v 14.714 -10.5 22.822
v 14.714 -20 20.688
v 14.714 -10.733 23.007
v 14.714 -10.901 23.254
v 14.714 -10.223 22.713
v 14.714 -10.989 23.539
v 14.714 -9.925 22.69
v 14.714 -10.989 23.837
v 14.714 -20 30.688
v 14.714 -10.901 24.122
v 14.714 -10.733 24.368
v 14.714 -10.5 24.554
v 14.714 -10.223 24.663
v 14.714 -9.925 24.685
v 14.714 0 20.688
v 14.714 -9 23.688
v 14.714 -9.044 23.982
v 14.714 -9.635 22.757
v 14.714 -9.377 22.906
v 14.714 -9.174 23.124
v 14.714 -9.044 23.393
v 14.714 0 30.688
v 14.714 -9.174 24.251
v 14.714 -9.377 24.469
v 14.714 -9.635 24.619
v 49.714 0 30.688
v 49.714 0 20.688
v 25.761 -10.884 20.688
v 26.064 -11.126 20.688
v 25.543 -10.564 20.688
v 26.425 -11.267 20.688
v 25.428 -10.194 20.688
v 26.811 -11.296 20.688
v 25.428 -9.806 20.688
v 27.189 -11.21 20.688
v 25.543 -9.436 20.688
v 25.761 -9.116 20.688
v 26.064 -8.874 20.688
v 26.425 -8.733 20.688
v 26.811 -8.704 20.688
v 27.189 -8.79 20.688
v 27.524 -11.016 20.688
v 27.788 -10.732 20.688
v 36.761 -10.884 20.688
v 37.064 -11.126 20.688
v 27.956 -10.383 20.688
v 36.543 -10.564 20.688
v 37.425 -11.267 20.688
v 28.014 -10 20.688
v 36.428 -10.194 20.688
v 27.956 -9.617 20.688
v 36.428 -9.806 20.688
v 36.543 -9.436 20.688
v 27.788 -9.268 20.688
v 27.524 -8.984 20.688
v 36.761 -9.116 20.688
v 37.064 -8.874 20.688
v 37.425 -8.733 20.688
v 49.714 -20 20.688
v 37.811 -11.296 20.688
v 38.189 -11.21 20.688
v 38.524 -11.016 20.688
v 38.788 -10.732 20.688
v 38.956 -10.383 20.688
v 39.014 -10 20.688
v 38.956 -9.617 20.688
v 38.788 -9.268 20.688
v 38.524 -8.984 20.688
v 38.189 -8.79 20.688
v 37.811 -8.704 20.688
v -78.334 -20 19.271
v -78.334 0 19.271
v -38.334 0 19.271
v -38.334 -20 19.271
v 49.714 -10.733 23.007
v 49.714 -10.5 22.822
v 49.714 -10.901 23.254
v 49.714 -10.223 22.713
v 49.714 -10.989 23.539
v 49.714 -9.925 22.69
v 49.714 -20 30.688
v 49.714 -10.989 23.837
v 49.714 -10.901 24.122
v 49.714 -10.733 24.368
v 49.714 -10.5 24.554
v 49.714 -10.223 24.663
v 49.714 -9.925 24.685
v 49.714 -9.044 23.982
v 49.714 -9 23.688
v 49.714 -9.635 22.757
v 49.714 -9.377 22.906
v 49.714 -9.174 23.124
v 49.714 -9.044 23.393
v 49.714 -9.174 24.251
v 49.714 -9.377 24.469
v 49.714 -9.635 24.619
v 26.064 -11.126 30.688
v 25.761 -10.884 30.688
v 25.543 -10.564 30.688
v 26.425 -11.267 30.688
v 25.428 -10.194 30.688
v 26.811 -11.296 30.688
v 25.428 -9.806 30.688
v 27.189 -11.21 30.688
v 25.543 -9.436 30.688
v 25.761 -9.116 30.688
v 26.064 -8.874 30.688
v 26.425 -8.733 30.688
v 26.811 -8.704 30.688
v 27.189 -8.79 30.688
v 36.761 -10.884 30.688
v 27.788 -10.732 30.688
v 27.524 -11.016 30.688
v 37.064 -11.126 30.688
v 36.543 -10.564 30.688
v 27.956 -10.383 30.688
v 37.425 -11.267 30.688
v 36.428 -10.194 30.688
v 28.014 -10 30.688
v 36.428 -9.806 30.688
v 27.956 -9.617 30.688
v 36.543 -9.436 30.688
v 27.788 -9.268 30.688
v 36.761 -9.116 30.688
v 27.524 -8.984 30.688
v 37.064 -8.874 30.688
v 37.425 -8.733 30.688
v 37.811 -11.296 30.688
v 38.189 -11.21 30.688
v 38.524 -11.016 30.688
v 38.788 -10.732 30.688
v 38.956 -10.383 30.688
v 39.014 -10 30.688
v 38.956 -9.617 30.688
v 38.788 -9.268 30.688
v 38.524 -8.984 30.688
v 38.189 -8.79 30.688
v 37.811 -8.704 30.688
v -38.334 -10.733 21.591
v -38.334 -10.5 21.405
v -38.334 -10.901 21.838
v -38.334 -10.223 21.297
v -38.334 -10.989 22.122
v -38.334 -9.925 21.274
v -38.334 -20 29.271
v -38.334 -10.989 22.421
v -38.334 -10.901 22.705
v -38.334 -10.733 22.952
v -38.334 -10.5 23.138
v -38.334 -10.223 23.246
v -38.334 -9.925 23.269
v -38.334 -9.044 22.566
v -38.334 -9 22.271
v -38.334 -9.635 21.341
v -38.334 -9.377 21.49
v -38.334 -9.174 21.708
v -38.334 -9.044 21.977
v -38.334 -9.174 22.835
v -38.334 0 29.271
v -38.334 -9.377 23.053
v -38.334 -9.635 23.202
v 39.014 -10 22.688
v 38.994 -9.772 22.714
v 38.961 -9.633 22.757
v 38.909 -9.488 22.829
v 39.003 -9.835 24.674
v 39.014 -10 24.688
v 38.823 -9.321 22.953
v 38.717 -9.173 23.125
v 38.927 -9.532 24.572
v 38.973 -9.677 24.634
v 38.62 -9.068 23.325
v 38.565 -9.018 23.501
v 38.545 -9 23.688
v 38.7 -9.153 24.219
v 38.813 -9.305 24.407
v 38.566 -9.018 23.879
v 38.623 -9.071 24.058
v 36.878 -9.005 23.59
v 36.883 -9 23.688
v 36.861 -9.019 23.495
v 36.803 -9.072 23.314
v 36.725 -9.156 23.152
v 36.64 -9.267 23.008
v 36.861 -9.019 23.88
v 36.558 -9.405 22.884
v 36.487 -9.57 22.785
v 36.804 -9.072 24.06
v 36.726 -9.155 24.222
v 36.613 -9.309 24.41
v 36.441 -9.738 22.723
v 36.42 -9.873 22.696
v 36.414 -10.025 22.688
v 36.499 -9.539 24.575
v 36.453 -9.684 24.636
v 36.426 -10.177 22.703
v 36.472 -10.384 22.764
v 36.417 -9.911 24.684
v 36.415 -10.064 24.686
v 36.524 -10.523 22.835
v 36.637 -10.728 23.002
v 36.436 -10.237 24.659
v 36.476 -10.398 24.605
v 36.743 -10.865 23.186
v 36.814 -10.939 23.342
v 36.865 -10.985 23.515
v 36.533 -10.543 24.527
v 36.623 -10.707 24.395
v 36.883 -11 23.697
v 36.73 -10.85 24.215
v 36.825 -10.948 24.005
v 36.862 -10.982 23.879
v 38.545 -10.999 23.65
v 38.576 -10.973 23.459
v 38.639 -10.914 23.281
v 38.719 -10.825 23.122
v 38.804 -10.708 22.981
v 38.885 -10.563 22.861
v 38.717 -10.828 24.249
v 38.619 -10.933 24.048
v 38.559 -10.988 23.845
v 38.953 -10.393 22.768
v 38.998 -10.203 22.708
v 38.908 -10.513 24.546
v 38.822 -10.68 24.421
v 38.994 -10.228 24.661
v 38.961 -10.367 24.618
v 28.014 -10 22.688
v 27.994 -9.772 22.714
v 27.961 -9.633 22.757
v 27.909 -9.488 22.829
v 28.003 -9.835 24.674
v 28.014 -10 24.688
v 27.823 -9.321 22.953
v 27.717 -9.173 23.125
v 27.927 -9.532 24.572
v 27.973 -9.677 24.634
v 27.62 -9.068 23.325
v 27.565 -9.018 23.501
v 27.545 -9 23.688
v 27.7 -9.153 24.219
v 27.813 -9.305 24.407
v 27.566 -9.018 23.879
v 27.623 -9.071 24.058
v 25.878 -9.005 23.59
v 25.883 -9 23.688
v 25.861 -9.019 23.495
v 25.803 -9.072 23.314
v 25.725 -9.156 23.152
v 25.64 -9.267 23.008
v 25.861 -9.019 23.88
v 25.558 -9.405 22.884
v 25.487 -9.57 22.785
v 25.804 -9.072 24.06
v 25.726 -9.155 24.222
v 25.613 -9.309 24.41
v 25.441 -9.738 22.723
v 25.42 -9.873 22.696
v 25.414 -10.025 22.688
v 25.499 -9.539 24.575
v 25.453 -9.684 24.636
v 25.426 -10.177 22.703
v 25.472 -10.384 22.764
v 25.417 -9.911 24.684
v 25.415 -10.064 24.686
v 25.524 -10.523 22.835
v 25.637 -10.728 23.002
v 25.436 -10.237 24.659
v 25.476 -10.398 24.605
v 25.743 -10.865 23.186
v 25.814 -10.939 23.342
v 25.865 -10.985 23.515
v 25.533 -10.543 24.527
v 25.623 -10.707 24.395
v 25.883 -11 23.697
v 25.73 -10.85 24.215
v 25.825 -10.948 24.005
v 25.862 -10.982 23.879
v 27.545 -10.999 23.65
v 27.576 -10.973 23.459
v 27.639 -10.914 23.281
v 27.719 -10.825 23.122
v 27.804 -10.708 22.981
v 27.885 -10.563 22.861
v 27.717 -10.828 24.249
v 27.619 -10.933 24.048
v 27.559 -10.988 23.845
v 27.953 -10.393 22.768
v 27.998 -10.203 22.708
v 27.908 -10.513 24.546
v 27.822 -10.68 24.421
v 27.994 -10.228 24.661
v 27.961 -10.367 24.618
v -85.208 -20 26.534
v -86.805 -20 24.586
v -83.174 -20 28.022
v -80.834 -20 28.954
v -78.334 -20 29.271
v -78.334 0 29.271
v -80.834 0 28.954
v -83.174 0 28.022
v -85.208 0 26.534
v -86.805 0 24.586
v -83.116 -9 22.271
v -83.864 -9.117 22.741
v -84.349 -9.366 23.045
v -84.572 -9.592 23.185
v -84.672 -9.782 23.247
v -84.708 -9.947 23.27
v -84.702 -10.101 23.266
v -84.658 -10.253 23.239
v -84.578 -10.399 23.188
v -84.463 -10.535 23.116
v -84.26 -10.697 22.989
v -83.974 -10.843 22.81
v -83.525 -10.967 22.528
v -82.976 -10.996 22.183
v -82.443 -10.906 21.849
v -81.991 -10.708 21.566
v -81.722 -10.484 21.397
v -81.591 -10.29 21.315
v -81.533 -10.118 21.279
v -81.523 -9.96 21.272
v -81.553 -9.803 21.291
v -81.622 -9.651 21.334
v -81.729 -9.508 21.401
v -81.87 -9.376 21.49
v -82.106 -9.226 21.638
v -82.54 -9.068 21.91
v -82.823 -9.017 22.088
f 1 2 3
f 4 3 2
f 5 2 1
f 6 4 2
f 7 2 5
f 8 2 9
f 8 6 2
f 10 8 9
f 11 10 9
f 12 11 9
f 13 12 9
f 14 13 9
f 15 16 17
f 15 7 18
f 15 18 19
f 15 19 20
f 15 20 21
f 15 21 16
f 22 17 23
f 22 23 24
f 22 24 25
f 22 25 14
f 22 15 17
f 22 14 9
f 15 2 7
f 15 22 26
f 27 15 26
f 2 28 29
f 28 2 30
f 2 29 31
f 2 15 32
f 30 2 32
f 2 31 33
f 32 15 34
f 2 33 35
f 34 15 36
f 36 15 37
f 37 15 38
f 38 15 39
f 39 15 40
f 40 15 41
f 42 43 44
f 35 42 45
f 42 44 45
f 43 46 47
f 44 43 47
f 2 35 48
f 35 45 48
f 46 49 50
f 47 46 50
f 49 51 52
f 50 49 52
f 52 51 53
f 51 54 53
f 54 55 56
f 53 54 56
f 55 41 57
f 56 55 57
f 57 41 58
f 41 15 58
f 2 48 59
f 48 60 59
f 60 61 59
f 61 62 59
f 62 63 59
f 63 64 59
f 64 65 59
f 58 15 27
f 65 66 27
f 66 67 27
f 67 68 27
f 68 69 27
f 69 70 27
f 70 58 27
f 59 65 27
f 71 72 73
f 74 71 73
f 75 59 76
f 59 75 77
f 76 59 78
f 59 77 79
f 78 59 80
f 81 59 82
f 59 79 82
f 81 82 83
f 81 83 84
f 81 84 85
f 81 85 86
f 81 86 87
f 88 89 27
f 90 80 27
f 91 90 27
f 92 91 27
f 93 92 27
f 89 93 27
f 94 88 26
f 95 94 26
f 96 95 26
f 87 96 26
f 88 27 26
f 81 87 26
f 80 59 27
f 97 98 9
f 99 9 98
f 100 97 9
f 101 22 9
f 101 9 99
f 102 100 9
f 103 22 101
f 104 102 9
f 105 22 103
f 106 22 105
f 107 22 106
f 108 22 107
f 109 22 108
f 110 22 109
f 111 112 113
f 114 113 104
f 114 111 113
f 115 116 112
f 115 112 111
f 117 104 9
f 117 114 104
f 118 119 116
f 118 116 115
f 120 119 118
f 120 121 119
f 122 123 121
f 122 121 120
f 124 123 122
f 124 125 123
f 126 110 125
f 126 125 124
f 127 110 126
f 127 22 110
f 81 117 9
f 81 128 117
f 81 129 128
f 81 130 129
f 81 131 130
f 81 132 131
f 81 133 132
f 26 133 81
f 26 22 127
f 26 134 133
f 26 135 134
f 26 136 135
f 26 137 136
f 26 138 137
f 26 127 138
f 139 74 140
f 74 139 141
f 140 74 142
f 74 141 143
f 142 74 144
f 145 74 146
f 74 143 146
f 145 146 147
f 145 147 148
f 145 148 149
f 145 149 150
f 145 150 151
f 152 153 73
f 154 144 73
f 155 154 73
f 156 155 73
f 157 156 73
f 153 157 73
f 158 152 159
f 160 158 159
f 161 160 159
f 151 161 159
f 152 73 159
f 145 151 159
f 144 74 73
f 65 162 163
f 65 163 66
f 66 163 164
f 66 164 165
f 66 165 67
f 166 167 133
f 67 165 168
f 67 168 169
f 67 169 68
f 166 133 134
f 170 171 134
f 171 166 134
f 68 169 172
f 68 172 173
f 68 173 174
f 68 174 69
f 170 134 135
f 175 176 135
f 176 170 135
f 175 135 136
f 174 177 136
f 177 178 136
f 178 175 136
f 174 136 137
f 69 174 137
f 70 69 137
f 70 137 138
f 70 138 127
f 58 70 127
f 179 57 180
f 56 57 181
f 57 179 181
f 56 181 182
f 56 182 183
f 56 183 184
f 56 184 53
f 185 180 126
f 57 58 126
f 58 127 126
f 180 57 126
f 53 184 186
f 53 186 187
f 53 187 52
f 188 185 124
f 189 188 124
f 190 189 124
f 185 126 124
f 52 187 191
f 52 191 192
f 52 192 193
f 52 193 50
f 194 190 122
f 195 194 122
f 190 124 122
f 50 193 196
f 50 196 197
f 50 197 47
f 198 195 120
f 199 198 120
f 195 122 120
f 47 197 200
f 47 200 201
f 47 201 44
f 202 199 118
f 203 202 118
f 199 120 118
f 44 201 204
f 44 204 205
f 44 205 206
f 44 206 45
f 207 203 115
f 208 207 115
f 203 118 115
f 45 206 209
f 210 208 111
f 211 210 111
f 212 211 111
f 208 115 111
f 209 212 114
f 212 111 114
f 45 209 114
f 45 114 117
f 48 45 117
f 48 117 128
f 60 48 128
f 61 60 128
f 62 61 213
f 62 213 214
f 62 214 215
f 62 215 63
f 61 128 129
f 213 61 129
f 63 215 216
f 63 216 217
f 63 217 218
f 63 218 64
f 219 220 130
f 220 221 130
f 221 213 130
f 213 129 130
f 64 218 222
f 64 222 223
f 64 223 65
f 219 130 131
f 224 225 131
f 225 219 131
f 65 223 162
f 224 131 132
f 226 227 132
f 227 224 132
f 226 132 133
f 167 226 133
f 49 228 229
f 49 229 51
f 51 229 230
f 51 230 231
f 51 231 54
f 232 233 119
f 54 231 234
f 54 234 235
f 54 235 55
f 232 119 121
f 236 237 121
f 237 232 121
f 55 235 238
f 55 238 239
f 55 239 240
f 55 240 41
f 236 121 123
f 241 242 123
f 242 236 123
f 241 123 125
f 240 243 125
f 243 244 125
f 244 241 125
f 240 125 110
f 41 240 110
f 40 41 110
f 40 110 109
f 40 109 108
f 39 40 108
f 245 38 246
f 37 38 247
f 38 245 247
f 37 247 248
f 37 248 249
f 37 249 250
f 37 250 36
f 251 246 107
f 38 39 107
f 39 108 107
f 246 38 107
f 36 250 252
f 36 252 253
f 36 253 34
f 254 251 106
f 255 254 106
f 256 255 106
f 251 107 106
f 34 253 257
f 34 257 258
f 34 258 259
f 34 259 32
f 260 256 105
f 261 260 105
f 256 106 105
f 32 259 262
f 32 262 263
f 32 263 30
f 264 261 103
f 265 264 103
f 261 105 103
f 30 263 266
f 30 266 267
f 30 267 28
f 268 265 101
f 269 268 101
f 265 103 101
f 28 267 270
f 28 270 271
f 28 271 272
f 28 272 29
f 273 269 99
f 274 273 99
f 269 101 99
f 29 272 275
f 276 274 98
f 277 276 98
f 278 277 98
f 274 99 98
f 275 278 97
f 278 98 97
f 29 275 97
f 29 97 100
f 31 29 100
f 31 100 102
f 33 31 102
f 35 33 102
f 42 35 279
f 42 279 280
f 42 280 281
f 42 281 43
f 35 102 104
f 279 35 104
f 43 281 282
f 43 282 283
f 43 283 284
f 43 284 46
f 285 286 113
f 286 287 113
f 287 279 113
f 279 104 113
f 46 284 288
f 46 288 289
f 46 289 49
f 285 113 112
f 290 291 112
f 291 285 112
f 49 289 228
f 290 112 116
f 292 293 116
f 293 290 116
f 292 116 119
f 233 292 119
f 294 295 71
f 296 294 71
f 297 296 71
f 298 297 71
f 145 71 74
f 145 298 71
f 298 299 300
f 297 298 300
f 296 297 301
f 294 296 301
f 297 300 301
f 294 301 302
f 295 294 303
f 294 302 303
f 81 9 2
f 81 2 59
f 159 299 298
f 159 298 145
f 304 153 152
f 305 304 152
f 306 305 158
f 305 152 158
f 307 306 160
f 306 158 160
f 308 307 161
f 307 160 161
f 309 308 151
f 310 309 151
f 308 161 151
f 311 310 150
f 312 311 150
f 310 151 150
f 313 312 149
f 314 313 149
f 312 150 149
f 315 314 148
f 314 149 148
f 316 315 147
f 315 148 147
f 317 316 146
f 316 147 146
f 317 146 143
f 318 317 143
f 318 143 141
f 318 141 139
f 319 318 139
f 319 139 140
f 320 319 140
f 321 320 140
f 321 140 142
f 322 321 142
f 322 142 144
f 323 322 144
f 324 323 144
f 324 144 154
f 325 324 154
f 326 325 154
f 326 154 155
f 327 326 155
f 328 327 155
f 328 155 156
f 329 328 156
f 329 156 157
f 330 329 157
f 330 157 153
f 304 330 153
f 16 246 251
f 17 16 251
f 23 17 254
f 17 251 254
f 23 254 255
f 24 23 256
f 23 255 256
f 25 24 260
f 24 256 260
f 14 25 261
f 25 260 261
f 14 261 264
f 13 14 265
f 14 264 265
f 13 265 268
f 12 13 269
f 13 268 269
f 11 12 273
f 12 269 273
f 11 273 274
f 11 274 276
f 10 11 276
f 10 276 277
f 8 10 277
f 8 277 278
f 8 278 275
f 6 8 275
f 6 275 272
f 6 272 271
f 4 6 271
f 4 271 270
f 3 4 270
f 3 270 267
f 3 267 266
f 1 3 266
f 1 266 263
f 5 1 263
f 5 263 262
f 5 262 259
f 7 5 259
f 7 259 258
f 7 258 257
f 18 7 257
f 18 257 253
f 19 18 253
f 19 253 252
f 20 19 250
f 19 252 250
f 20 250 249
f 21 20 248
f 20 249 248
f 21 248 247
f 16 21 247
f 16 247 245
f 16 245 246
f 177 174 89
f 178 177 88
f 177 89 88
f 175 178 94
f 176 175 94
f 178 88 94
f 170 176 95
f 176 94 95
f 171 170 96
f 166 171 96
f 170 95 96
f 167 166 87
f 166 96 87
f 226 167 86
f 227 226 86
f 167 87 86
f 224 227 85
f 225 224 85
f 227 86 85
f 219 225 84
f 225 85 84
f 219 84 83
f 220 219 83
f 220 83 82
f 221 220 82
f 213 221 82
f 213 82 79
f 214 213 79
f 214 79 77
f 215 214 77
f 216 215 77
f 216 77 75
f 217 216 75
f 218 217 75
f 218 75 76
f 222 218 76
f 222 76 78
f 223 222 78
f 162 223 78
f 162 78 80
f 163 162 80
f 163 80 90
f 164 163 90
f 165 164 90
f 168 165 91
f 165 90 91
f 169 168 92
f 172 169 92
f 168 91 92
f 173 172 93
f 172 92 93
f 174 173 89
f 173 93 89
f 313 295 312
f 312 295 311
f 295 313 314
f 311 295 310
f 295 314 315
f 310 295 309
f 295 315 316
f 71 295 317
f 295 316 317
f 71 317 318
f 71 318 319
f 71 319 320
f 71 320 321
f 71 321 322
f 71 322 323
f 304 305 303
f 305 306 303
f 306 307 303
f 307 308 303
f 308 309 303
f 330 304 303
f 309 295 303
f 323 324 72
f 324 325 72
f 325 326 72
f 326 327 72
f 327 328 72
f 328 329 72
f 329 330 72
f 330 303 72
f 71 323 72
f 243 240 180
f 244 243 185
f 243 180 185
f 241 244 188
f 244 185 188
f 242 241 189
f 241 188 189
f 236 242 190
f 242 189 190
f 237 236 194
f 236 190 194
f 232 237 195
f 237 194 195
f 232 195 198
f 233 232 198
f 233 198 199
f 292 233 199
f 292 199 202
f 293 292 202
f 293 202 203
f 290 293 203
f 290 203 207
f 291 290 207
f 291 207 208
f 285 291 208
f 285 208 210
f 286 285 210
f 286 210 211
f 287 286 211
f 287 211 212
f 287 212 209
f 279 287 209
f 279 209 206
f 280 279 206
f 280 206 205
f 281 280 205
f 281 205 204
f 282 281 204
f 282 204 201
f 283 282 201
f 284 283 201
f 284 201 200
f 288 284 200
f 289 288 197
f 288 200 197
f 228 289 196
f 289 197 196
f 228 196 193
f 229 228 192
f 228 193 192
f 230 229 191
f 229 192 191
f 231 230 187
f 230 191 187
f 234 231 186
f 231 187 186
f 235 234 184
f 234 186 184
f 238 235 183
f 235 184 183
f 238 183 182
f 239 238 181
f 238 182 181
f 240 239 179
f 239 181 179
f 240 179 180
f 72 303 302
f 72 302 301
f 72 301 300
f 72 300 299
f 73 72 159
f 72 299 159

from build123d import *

# Parameters (mm, degrees)
F0_W     = 40
F0_H     = 10
F0_W_2   = 35
F1_DEPTH = 20
F2_R     = 1
F3_DEPTH = 58.166
F4_R     = 1
F5_DEPTH = 44.9834
F6_R     = 1.3
F7_DEPTH = 25.4


with BuildPart() as f1:
    # F0 (on Front) → F1 (new body)
    with BuildSketch(Plane.XZ):
        with Locations((-58.333964, 24.271492)):
            Rectangle(F0_W, F0_H)
        with BuildLine():
            Line((-86.805105, 24.585603), (-78.333964, 19.271492))
            Line((-78.333964, 19.271492), (-78.333964, 29.271492))
            ThreePointArc((-78.333964, 29.271492), (-83.174362, 28.021952), (-86.805105, 24.585603))
        make_face()
        with Locations((32.213918, 25.687634)):
            Rectangle(F0_W_2, F0_H)
    extrude(amount=F1_DEPTH)

    # F2 (on face) → F3 (cut)
    with BuildSketch(Plane.YZ.offset(-38.333964)):
        with Locations((-10, 22.271492)):
            Circle(F2_R)
    extrude(amount=-F3_DEPTH, mode=Mode.SUBTRACT)

    # F4 (on face) → F5 (cut)
    with BuildSketch(Plane.YZ.offset(49.713918)):
        with Locations((-10, 23.687634)):
            Circle(F4_R)
    extrude(amount=-F5_DEPTH, mode=Mode.SUBTRACT)

    # F6 (on face) → F7 (cut)
    with BuildSketch(Plane.XY.offset(30.687634)):
        with Locations((26.713918, -10)):
            Circle(F6_R)
        with Locations((37.713918, -10)):
            Circle(F6_R)
    extrude(amount=-F7_DEPTH, mode=Mode.SUBTRACT)


solid = f1.part
